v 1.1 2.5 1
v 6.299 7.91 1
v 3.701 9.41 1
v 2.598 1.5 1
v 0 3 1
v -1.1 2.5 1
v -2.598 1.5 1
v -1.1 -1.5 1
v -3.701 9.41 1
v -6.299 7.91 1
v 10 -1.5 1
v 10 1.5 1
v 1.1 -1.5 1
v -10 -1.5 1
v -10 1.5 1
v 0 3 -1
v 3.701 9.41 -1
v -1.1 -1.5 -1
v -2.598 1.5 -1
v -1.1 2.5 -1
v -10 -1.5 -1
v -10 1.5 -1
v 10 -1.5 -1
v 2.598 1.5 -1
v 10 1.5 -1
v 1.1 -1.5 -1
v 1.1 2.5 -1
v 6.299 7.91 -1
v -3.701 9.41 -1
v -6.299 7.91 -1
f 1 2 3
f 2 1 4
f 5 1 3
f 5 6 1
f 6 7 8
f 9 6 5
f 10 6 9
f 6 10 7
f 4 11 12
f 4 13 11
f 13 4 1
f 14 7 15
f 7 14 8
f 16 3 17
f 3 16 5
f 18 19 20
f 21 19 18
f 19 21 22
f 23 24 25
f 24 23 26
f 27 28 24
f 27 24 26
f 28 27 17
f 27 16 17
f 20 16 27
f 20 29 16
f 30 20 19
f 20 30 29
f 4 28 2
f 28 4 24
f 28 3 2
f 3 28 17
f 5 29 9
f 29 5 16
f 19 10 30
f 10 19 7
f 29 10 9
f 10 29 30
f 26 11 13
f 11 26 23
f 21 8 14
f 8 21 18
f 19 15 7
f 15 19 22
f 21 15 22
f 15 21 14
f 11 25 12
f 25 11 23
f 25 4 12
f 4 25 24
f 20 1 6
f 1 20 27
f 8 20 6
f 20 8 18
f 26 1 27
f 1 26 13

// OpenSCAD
/* [Basics] */
number_of_spokes = 6; // [2,4,6,8,10,12,14,16,18,20]
length	= 10; // [1:20]
width =3; // [1:10]
thickness	= 2; // [1:10]

/* [Connection settings] */
connecting = "yes"; // [yes:Yes 3D,no: No I am in flat land]
connect_length = 5;
little_extra = .2;

module basic(){
intersection(){
	for(a=[1:number_of_spokes]){
		rotate([0,0,(360/number_of_spokes)*a]) translate([length/2,0,0])  cube([length,width,thickness], center=true);
	}
	translate([-length*2,-width/2,-length/2]) cube([50,length*2,50], center=false);
}
}

if(connecting=="yes"){
difference(){
	basic();
	rotate([0,0,90]) cube([connect_length,thickness+little_extra,thickness+little_extra], center=true);
}
}
else{
basic();
}
